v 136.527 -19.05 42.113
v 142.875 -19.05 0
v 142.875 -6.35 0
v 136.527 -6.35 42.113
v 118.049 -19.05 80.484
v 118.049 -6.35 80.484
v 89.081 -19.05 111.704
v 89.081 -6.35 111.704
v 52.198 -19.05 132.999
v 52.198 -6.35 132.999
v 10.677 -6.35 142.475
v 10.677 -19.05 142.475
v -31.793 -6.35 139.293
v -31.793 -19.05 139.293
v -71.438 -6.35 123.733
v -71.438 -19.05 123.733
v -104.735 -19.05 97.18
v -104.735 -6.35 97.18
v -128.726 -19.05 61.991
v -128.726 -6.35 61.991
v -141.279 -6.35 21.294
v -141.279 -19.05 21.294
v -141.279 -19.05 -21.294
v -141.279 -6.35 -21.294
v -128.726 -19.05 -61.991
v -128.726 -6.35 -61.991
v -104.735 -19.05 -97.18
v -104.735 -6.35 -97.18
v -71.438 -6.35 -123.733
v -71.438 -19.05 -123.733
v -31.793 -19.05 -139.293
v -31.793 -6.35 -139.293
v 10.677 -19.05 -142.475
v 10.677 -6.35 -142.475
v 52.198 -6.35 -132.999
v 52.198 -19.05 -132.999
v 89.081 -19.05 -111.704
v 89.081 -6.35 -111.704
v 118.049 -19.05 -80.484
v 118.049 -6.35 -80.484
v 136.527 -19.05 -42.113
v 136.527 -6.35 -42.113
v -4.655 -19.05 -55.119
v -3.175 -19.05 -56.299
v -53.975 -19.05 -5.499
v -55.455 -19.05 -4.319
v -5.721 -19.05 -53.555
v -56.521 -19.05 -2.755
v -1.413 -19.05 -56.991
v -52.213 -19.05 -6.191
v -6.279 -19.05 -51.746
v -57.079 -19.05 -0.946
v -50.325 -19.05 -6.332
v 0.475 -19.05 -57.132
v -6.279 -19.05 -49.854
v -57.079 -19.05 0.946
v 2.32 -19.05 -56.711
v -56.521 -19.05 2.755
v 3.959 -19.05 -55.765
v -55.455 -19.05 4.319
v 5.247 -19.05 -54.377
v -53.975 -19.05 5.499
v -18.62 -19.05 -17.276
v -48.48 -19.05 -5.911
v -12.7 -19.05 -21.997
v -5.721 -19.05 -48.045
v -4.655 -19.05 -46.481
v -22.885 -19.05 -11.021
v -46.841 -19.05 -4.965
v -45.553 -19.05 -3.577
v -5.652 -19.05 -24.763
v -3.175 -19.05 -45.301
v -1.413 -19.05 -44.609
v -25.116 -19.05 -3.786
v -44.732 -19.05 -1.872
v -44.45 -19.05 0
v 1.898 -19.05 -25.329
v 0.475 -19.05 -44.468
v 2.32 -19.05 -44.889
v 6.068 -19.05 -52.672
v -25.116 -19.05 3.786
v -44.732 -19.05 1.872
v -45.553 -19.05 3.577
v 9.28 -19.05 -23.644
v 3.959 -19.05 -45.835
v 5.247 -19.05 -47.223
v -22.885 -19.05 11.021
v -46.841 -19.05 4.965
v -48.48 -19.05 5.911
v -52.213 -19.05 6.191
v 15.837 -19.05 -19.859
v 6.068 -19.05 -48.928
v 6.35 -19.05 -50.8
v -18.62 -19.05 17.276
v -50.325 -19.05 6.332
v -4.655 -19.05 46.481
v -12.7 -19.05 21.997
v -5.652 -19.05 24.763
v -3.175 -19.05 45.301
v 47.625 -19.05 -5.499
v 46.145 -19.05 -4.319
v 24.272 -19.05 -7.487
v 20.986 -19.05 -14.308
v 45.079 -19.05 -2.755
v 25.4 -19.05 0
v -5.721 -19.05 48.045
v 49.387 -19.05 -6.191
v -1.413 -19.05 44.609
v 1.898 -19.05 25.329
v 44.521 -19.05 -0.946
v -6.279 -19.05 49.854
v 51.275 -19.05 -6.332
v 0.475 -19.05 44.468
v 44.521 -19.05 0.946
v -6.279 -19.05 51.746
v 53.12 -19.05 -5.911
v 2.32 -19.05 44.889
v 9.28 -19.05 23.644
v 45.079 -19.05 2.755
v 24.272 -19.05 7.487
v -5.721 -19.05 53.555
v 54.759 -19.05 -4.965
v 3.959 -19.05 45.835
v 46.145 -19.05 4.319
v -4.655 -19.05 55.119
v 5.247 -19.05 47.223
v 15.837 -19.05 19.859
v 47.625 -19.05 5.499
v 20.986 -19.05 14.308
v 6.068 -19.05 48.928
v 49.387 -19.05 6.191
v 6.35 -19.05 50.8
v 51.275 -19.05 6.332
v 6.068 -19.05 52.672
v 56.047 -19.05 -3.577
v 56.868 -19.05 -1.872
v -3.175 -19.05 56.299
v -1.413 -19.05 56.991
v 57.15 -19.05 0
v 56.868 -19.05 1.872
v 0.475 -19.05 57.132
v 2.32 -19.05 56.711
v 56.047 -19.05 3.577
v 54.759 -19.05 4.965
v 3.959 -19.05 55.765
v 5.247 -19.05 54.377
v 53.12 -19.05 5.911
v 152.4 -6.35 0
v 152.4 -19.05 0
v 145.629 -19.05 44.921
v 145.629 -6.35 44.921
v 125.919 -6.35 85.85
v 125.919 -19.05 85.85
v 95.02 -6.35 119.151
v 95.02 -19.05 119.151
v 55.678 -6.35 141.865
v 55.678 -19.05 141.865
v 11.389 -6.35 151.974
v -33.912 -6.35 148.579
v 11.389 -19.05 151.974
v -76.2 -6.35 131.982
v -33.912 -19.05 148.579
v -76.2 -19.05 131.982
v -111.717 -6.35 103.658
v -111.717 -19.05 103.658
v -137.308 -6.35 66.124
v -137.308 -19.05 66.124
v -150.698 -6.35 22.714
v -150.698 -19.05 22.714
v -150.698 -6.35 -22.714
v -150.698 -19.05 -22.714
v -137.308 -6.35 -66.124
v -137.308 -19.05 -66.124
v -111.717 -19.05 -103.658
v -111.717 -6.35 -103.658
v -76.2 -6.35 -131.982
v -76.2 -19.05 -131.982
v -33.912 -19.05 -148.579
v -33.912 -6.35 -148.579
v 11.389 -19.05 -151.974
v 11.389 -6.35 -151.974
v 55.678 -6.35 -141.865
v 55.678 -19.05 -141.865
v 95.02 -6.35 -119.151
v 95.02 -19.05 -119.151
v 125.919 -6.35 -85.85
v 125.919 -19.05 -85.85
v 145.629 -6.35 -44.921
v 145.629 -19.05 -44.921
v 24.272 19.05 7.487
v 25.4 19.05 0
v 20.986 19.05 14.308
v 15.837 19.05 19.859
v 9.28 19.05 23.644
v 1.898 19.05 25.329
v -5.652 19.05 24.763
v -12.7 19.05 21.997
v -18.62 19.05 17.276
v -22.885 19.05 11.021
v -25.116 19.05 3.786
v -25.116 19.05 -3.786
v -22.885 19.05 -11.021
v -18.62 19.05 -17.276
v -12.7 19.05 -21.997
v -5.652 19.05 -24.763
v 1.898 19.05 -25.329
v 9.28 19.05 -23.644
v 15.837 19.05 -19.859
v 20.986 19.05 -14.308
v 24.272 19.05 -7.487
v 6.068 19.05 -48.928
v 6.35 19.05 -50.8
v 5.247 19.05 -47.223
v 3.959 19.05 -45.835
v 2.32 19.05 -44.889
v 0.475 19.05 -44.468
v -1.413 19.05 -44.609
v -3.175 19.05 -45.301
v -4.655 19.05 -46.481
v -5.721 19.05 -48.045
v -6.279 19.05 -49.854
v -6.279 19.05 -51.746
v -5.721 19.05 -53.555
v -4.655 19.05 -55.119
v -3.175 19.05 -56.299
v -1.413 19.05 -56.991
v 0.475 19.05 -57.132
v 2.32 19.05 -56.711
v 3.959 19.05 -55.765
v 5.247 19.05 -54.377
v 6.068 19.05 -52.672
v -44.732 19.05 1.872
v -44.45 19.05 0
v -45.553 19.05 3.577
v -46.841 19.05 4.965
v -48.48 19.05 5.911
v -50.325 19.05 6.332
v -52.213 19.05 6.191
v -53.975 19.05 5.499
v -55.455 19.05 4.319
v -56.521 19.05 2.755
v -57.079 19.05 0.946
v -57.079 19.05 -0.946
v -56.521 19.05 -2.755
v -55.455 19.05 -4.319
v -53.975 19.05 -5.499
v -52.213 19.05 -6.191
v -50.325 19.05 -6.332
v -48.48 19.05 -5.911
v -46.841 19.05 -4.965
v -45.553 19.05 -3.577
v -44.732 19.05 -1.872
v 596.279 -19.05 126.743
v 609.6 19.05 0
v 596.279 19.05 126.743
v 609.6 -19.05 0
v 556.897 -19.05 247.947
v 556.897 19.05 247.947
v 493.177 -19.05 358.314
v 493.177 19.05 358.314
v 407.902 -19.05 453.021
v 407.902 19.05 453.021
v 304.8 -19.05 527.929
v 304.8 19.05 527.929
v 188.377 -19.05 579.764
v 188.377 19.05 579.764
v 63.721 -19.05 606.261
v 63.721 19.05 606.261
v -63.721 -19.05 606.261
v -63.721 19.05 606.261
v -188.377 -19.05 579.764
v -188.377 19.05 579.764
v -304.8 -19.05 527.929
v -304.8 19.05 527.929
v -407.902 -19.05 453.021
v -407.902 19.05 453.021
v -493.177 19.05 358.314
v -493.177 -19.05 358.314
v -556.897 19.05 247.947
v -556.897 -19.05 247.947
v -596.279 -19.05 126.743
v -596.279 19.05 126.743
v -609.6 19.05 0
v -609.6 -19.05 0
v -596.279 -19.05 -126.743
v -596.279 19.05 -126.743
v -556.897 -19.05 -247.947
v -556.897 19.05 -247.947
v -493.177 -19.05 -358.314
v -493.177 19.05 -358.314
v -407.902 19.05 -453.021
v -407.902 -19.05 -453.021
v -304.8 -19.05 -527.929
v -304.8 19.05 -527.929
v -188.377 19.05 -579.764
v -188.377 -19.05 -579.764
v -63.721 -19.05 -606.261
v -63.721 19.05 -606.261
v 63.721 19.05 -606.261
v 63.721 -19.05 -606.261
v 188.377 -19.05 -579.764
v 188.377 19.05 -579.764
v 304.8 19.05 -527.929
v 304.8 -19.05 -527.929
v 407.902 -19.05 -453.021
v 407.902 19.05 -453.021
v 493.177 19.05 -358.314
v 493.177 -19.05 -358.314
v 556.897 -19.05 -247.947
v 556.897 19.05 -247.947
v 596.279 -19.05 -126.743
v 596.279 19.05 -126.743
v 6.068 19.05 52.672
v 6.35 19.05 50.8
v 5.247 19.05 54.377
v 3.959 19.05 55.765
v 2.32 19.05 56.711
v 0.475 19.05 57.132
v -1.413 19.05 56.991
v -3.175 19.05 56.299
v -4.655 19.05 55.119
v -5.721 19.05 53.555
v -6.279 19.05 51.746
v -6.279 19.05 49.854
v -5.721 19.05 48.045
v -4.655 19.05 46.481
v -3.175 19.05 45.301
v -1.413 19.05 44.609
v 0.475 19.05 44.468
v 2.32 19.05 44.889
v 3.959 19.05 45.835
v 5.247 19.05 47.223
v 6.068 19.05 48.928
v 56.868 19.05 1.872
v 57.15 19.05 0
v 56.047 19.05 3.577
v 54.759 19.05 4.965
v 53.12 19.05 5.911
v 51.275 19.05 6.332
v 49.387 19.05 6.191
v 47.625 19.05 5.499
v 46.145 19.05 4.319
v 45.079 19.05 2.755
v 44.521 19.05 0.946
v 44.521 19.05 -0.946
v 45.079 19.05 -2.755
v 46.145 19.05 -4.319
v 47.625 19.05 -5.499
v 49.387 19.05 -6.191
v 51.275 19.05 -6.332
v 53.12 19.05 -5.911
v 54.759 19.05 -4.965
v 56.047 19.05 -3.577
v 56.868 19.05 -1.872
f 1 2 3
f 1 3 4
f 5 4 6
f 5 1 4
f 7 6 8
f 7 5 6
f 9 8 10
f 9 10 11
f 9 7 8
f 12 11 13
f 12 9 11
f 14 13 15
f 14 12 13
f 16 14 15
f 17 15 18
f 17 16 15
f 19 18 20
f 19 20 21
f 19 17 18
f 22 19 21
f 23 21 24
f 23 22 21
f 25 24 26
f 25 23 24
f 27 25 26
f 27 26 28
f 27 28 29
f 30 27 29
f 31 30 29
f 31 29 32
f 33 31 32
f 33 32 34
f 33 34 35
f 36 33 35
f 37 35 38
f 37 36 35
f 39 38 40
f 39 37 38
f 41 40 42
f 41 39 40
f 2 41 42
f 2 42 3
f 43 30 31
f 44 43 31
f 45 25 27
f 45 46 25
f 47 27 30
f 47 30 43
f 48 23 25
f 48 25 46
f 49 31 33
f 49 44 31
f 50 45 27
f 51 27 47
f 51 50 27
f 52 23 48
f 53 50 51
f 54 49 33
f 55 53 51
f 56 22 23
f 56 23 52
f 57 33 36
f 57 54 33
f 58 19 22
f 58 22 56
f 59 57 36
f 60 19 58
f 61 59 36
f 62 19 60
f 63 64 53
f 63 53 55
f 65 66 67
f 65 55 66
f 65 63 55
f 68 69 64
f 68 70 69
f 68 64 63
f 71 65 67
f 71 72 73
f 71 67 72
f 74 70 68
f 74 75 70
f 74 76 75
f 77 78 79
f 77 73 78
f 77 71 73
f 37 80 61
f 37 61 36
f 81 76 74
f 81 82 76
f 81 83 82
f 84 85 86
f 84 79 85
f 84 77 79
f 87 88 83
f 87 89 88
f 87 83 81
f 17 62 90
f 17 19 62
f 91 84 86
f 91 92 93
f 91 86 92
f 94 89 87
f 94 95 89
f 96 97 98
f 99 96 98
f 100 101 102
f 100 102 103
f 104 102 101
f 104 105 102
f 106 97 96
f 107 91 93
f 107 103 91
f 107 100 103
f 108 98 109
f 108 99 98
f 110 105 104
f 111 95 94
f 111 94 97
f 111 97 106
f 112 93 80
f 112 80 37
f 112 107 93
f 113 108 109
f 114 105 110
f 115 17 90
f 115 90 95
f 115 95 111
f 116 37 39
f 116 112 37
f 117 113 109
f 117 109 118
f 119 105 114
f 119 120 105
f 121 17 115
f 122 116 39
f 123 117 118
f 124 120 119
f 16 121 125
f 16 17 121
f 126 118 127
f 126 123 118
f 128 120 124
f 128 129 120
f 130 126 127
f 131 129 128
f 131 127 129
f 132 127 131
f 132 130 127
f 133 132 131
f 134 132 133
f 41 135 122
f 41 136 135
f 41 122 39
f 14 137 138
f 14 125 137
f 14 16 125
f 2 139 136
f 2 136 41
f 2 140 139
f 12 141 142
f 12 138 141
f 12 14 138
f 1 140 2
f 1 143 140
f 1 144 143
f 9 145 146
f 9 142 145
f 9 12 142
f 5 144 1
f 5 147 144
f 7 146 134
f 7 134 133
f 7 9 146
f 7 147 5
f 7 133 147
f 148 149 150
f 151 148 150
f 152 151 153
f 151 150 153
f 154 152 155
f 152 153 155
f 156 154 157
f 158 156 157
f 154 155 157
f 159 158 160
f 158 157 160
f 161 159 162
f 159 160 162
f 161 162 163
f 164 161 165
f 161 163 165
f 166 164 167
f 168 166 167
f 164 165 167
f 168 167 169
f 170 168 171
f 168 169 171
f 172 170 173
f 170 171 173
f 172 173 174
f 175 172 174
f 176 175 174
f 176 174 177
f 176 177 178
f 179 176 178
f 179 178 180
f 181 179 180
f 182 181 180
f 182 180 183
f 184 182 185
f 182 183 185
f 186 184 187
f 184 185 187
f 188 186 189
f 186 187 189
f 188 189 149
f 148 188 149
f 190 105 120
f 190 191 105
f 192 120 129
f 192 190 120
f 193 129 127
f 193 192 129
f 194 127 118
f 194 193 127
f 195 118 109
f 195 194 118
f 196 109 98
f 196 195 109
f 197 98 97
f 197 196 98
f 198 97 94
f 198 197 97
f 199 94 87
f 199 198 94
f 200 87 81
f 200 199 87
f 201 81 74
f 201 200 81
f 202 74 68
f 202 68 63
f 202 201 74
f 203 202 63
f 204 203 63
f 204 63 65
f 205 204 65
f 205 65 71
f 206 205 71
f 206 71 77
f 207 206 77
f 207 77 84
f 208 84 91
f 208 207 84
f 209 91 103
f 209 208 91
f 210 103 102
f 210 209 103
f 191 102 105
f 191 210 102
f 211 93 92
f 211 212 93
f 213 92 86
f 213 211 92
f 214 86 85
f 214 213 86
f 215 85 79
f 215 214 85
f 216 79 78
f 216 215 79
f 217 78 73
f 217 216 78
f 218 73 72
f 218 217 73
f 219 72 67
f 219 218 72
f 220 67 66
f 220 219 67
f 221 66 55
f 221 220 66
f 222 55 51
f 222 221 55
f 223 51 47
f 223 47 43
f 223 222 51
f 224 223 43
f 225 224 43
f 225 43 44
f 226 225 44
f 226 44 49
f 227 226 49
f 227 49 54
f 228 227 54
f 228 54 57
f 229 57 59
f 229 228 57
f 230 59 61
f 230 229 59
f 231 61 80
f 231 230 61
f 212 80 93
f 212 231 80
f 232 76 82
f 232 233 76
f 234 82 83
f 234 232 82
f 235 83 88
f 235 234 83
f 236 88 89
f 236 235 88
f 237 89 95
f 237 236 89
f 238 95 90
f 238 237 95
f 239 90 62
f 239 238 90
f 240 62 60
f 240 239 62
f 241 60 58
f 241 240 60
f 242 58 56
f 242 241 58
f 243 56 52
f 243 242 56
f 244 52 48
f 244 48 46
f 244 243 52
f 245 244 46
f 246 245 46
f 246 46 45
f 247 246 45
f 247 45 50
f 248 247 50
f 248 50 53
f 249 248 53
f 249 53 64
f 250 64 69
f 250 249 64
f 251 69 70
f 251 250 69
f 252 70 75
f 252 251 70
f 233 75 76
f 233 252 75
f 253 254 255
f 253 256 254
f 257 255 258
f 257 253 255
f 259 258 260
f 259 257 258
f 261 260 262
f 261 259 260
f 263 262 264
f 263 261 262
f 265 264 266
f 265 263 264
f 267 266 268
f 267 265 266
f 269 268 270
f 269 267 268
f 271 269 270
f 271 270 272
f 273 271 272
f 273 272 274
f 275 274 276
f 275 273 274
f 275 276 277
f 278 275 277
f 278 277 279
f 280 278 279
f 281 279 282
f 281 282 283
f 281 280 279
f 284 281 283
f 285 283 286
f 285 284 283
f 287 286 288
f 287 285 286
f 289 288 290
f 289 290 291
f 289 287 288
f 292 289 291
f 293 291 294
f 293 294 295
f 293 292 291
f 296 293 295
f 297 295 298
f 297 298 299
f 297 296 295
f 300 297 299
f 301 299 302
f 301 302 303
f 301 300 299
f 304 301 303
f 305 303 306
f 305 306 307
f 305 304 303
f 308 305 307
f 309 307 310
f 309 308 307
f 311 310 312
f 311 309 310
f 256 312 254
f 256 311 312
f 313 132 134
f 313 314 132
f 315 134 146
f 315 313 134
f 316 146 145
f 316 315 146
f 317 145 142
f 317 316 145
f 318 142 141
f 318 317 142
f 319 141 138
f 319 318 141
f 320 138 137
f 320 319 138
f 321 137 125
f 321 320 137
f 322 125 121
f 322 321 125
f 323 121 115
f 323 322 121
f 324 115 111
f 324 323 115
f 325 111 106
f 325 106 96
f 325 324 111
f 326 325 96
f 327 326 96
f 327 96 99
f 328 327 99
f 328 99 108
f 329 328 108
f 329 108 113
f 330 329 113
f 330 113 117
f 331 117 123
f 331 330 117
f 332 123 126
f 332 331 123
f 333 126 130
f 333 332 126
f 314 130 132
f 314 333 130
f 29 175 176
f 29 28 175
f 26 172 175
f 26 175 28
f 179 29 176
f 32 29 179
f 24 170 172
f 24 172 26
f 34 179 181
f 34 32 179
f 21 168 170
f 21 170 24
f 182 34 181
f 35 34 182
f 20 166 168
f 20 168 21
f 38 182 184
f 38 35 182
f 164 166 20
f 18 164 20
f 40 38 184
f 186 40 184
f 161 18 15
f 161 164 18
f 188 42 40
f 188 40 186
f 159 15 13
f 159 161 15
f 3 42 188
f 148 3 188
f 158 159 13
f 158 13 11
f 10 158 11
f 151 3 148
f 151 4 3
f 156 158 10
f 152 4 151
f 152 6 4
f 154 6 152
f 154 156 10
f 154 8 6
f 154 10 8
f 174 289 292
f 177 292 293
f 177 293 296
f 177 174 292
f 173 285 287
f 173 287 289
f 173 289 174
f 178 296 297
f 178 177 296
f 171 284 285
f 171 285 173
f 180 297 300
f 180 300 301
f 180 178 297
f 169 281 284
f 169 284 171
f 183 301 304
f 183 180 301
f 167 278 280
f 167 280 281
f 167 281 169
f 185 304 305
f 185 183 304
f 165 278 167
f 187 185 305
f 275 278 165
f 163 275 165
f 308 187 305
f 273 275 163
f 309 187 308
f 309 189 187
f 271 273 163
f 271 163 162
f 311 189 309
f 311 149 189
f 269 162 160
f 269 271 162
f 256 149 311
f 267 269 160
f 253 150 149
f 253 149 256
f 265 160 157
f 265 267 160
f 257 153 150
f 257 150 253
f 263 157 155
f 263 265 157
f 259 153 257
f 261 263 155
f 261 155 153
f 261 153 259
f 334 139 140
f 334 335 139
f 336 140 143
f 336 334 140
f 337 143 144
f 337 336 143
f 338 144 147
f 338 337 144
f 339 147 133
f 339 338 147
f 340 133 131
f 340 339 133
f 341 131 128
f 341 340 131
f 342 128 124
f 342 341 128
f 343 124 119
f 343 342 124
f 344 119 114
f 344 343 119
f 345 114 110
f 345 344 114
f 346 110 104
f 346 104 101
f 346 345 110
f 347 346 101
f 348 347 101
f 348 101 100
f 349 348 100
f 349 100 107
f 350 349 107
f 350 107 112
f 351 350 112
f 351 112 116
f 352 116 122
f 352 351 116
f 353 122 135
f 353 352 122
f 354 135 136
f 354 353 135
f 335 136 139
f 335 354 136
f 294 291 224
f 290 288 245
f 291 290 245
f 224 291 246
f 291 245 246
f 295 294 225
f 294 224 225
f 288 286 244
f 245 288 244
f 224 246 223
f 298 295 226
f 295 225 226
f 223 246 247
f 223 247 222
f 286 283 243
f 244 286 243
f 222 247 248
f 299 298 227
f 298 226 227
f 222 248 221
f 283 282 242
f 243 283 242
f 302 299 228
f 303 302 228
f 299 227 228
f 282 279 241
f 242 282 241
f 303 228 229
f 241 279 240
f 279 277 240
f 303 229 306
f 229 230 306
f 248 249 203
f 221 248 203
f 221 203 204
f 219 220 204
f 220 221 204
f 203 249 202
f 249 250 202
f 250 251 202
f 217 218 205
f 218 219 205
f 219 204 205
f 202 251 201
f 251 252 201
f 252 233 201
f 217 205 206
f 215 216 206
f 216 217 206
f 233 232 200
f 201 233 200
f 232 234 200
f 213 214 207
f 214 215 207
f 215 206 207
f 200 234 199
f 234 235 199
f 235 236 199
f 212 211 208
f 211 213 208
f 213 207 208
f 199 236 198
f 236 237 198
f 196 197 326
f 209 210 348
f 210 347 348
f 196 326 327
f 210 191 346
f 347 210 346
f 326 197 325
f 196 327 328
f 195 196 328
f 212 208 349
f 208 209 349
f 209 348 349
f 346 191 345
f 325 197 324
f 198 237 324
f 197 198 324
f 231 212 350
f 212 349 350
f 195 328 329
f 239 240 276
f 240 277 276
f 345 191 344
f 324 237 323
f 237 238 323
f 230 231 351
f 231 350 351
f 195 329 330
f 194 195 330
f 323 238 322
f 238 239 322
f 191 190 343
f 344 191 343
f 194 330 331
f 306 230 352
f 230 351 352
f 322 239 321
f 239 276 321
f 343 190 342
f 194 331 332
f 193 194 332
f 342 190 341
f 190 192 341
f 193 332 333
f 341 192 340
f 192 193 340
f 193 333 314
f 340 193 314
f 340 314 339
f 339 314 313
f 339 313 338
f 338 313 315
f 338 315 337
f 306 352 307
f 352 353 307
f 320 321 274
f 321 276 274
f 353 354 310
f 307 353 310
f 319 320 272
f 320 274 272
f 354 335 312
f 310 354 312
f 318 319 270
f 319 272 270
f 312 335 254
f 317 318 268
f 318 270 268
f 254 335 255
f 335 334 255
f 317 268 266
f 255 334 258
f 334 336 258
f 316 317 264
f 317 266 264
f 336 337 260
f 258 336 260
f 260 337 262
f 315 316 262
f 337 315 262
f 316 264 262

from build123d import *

# Parameters (mm, degrees)
F0_R     = 609.6
F0_R_2   = 6.35
F0_R_3   = 25.4
F1_DEPTH = 19.05
F2_R     = 152.4
F2_R_2   = 142.875
F3_DEPTH = 12.7


with BuildPart() as f1:
    # F0 (on Front) → F1 (new body, symmetric)
    with BuildSketch(Plane.XZ):
        Circle(F0_R)
        with Locations((0, -50.8)):
            Circle(F0_R_2, mode=Mode.SUBTRACT)
        with Locations((-50.8, 0)):
            Circle(F0_R_2, mode=Mode.SUBTRACT)
        Circle(F0_R_3, mode=Mode.SUBTRACT)
        with Locations((50.8, 0)):
            Circle(F0_R_2, mode=Mode.SUBTRACT)
        with Locations((0, 50.8)):
            Circle(F0_R_2, mode=Mode.SUBTRACT)
    extrude(amount=F1_DEPTH, both=True)

    # F2 (on face) → F3 (cut)
    with BuildSketch(Plane.XZ.offset(19.05)):
        Circle(F2_R)
        Circle(F2_R_2, mode=Mode.SUBTRACT)
    extrude(amount=-F3_DEPTH, mode=Mode.SUBTRACT)


solid = f1.part
